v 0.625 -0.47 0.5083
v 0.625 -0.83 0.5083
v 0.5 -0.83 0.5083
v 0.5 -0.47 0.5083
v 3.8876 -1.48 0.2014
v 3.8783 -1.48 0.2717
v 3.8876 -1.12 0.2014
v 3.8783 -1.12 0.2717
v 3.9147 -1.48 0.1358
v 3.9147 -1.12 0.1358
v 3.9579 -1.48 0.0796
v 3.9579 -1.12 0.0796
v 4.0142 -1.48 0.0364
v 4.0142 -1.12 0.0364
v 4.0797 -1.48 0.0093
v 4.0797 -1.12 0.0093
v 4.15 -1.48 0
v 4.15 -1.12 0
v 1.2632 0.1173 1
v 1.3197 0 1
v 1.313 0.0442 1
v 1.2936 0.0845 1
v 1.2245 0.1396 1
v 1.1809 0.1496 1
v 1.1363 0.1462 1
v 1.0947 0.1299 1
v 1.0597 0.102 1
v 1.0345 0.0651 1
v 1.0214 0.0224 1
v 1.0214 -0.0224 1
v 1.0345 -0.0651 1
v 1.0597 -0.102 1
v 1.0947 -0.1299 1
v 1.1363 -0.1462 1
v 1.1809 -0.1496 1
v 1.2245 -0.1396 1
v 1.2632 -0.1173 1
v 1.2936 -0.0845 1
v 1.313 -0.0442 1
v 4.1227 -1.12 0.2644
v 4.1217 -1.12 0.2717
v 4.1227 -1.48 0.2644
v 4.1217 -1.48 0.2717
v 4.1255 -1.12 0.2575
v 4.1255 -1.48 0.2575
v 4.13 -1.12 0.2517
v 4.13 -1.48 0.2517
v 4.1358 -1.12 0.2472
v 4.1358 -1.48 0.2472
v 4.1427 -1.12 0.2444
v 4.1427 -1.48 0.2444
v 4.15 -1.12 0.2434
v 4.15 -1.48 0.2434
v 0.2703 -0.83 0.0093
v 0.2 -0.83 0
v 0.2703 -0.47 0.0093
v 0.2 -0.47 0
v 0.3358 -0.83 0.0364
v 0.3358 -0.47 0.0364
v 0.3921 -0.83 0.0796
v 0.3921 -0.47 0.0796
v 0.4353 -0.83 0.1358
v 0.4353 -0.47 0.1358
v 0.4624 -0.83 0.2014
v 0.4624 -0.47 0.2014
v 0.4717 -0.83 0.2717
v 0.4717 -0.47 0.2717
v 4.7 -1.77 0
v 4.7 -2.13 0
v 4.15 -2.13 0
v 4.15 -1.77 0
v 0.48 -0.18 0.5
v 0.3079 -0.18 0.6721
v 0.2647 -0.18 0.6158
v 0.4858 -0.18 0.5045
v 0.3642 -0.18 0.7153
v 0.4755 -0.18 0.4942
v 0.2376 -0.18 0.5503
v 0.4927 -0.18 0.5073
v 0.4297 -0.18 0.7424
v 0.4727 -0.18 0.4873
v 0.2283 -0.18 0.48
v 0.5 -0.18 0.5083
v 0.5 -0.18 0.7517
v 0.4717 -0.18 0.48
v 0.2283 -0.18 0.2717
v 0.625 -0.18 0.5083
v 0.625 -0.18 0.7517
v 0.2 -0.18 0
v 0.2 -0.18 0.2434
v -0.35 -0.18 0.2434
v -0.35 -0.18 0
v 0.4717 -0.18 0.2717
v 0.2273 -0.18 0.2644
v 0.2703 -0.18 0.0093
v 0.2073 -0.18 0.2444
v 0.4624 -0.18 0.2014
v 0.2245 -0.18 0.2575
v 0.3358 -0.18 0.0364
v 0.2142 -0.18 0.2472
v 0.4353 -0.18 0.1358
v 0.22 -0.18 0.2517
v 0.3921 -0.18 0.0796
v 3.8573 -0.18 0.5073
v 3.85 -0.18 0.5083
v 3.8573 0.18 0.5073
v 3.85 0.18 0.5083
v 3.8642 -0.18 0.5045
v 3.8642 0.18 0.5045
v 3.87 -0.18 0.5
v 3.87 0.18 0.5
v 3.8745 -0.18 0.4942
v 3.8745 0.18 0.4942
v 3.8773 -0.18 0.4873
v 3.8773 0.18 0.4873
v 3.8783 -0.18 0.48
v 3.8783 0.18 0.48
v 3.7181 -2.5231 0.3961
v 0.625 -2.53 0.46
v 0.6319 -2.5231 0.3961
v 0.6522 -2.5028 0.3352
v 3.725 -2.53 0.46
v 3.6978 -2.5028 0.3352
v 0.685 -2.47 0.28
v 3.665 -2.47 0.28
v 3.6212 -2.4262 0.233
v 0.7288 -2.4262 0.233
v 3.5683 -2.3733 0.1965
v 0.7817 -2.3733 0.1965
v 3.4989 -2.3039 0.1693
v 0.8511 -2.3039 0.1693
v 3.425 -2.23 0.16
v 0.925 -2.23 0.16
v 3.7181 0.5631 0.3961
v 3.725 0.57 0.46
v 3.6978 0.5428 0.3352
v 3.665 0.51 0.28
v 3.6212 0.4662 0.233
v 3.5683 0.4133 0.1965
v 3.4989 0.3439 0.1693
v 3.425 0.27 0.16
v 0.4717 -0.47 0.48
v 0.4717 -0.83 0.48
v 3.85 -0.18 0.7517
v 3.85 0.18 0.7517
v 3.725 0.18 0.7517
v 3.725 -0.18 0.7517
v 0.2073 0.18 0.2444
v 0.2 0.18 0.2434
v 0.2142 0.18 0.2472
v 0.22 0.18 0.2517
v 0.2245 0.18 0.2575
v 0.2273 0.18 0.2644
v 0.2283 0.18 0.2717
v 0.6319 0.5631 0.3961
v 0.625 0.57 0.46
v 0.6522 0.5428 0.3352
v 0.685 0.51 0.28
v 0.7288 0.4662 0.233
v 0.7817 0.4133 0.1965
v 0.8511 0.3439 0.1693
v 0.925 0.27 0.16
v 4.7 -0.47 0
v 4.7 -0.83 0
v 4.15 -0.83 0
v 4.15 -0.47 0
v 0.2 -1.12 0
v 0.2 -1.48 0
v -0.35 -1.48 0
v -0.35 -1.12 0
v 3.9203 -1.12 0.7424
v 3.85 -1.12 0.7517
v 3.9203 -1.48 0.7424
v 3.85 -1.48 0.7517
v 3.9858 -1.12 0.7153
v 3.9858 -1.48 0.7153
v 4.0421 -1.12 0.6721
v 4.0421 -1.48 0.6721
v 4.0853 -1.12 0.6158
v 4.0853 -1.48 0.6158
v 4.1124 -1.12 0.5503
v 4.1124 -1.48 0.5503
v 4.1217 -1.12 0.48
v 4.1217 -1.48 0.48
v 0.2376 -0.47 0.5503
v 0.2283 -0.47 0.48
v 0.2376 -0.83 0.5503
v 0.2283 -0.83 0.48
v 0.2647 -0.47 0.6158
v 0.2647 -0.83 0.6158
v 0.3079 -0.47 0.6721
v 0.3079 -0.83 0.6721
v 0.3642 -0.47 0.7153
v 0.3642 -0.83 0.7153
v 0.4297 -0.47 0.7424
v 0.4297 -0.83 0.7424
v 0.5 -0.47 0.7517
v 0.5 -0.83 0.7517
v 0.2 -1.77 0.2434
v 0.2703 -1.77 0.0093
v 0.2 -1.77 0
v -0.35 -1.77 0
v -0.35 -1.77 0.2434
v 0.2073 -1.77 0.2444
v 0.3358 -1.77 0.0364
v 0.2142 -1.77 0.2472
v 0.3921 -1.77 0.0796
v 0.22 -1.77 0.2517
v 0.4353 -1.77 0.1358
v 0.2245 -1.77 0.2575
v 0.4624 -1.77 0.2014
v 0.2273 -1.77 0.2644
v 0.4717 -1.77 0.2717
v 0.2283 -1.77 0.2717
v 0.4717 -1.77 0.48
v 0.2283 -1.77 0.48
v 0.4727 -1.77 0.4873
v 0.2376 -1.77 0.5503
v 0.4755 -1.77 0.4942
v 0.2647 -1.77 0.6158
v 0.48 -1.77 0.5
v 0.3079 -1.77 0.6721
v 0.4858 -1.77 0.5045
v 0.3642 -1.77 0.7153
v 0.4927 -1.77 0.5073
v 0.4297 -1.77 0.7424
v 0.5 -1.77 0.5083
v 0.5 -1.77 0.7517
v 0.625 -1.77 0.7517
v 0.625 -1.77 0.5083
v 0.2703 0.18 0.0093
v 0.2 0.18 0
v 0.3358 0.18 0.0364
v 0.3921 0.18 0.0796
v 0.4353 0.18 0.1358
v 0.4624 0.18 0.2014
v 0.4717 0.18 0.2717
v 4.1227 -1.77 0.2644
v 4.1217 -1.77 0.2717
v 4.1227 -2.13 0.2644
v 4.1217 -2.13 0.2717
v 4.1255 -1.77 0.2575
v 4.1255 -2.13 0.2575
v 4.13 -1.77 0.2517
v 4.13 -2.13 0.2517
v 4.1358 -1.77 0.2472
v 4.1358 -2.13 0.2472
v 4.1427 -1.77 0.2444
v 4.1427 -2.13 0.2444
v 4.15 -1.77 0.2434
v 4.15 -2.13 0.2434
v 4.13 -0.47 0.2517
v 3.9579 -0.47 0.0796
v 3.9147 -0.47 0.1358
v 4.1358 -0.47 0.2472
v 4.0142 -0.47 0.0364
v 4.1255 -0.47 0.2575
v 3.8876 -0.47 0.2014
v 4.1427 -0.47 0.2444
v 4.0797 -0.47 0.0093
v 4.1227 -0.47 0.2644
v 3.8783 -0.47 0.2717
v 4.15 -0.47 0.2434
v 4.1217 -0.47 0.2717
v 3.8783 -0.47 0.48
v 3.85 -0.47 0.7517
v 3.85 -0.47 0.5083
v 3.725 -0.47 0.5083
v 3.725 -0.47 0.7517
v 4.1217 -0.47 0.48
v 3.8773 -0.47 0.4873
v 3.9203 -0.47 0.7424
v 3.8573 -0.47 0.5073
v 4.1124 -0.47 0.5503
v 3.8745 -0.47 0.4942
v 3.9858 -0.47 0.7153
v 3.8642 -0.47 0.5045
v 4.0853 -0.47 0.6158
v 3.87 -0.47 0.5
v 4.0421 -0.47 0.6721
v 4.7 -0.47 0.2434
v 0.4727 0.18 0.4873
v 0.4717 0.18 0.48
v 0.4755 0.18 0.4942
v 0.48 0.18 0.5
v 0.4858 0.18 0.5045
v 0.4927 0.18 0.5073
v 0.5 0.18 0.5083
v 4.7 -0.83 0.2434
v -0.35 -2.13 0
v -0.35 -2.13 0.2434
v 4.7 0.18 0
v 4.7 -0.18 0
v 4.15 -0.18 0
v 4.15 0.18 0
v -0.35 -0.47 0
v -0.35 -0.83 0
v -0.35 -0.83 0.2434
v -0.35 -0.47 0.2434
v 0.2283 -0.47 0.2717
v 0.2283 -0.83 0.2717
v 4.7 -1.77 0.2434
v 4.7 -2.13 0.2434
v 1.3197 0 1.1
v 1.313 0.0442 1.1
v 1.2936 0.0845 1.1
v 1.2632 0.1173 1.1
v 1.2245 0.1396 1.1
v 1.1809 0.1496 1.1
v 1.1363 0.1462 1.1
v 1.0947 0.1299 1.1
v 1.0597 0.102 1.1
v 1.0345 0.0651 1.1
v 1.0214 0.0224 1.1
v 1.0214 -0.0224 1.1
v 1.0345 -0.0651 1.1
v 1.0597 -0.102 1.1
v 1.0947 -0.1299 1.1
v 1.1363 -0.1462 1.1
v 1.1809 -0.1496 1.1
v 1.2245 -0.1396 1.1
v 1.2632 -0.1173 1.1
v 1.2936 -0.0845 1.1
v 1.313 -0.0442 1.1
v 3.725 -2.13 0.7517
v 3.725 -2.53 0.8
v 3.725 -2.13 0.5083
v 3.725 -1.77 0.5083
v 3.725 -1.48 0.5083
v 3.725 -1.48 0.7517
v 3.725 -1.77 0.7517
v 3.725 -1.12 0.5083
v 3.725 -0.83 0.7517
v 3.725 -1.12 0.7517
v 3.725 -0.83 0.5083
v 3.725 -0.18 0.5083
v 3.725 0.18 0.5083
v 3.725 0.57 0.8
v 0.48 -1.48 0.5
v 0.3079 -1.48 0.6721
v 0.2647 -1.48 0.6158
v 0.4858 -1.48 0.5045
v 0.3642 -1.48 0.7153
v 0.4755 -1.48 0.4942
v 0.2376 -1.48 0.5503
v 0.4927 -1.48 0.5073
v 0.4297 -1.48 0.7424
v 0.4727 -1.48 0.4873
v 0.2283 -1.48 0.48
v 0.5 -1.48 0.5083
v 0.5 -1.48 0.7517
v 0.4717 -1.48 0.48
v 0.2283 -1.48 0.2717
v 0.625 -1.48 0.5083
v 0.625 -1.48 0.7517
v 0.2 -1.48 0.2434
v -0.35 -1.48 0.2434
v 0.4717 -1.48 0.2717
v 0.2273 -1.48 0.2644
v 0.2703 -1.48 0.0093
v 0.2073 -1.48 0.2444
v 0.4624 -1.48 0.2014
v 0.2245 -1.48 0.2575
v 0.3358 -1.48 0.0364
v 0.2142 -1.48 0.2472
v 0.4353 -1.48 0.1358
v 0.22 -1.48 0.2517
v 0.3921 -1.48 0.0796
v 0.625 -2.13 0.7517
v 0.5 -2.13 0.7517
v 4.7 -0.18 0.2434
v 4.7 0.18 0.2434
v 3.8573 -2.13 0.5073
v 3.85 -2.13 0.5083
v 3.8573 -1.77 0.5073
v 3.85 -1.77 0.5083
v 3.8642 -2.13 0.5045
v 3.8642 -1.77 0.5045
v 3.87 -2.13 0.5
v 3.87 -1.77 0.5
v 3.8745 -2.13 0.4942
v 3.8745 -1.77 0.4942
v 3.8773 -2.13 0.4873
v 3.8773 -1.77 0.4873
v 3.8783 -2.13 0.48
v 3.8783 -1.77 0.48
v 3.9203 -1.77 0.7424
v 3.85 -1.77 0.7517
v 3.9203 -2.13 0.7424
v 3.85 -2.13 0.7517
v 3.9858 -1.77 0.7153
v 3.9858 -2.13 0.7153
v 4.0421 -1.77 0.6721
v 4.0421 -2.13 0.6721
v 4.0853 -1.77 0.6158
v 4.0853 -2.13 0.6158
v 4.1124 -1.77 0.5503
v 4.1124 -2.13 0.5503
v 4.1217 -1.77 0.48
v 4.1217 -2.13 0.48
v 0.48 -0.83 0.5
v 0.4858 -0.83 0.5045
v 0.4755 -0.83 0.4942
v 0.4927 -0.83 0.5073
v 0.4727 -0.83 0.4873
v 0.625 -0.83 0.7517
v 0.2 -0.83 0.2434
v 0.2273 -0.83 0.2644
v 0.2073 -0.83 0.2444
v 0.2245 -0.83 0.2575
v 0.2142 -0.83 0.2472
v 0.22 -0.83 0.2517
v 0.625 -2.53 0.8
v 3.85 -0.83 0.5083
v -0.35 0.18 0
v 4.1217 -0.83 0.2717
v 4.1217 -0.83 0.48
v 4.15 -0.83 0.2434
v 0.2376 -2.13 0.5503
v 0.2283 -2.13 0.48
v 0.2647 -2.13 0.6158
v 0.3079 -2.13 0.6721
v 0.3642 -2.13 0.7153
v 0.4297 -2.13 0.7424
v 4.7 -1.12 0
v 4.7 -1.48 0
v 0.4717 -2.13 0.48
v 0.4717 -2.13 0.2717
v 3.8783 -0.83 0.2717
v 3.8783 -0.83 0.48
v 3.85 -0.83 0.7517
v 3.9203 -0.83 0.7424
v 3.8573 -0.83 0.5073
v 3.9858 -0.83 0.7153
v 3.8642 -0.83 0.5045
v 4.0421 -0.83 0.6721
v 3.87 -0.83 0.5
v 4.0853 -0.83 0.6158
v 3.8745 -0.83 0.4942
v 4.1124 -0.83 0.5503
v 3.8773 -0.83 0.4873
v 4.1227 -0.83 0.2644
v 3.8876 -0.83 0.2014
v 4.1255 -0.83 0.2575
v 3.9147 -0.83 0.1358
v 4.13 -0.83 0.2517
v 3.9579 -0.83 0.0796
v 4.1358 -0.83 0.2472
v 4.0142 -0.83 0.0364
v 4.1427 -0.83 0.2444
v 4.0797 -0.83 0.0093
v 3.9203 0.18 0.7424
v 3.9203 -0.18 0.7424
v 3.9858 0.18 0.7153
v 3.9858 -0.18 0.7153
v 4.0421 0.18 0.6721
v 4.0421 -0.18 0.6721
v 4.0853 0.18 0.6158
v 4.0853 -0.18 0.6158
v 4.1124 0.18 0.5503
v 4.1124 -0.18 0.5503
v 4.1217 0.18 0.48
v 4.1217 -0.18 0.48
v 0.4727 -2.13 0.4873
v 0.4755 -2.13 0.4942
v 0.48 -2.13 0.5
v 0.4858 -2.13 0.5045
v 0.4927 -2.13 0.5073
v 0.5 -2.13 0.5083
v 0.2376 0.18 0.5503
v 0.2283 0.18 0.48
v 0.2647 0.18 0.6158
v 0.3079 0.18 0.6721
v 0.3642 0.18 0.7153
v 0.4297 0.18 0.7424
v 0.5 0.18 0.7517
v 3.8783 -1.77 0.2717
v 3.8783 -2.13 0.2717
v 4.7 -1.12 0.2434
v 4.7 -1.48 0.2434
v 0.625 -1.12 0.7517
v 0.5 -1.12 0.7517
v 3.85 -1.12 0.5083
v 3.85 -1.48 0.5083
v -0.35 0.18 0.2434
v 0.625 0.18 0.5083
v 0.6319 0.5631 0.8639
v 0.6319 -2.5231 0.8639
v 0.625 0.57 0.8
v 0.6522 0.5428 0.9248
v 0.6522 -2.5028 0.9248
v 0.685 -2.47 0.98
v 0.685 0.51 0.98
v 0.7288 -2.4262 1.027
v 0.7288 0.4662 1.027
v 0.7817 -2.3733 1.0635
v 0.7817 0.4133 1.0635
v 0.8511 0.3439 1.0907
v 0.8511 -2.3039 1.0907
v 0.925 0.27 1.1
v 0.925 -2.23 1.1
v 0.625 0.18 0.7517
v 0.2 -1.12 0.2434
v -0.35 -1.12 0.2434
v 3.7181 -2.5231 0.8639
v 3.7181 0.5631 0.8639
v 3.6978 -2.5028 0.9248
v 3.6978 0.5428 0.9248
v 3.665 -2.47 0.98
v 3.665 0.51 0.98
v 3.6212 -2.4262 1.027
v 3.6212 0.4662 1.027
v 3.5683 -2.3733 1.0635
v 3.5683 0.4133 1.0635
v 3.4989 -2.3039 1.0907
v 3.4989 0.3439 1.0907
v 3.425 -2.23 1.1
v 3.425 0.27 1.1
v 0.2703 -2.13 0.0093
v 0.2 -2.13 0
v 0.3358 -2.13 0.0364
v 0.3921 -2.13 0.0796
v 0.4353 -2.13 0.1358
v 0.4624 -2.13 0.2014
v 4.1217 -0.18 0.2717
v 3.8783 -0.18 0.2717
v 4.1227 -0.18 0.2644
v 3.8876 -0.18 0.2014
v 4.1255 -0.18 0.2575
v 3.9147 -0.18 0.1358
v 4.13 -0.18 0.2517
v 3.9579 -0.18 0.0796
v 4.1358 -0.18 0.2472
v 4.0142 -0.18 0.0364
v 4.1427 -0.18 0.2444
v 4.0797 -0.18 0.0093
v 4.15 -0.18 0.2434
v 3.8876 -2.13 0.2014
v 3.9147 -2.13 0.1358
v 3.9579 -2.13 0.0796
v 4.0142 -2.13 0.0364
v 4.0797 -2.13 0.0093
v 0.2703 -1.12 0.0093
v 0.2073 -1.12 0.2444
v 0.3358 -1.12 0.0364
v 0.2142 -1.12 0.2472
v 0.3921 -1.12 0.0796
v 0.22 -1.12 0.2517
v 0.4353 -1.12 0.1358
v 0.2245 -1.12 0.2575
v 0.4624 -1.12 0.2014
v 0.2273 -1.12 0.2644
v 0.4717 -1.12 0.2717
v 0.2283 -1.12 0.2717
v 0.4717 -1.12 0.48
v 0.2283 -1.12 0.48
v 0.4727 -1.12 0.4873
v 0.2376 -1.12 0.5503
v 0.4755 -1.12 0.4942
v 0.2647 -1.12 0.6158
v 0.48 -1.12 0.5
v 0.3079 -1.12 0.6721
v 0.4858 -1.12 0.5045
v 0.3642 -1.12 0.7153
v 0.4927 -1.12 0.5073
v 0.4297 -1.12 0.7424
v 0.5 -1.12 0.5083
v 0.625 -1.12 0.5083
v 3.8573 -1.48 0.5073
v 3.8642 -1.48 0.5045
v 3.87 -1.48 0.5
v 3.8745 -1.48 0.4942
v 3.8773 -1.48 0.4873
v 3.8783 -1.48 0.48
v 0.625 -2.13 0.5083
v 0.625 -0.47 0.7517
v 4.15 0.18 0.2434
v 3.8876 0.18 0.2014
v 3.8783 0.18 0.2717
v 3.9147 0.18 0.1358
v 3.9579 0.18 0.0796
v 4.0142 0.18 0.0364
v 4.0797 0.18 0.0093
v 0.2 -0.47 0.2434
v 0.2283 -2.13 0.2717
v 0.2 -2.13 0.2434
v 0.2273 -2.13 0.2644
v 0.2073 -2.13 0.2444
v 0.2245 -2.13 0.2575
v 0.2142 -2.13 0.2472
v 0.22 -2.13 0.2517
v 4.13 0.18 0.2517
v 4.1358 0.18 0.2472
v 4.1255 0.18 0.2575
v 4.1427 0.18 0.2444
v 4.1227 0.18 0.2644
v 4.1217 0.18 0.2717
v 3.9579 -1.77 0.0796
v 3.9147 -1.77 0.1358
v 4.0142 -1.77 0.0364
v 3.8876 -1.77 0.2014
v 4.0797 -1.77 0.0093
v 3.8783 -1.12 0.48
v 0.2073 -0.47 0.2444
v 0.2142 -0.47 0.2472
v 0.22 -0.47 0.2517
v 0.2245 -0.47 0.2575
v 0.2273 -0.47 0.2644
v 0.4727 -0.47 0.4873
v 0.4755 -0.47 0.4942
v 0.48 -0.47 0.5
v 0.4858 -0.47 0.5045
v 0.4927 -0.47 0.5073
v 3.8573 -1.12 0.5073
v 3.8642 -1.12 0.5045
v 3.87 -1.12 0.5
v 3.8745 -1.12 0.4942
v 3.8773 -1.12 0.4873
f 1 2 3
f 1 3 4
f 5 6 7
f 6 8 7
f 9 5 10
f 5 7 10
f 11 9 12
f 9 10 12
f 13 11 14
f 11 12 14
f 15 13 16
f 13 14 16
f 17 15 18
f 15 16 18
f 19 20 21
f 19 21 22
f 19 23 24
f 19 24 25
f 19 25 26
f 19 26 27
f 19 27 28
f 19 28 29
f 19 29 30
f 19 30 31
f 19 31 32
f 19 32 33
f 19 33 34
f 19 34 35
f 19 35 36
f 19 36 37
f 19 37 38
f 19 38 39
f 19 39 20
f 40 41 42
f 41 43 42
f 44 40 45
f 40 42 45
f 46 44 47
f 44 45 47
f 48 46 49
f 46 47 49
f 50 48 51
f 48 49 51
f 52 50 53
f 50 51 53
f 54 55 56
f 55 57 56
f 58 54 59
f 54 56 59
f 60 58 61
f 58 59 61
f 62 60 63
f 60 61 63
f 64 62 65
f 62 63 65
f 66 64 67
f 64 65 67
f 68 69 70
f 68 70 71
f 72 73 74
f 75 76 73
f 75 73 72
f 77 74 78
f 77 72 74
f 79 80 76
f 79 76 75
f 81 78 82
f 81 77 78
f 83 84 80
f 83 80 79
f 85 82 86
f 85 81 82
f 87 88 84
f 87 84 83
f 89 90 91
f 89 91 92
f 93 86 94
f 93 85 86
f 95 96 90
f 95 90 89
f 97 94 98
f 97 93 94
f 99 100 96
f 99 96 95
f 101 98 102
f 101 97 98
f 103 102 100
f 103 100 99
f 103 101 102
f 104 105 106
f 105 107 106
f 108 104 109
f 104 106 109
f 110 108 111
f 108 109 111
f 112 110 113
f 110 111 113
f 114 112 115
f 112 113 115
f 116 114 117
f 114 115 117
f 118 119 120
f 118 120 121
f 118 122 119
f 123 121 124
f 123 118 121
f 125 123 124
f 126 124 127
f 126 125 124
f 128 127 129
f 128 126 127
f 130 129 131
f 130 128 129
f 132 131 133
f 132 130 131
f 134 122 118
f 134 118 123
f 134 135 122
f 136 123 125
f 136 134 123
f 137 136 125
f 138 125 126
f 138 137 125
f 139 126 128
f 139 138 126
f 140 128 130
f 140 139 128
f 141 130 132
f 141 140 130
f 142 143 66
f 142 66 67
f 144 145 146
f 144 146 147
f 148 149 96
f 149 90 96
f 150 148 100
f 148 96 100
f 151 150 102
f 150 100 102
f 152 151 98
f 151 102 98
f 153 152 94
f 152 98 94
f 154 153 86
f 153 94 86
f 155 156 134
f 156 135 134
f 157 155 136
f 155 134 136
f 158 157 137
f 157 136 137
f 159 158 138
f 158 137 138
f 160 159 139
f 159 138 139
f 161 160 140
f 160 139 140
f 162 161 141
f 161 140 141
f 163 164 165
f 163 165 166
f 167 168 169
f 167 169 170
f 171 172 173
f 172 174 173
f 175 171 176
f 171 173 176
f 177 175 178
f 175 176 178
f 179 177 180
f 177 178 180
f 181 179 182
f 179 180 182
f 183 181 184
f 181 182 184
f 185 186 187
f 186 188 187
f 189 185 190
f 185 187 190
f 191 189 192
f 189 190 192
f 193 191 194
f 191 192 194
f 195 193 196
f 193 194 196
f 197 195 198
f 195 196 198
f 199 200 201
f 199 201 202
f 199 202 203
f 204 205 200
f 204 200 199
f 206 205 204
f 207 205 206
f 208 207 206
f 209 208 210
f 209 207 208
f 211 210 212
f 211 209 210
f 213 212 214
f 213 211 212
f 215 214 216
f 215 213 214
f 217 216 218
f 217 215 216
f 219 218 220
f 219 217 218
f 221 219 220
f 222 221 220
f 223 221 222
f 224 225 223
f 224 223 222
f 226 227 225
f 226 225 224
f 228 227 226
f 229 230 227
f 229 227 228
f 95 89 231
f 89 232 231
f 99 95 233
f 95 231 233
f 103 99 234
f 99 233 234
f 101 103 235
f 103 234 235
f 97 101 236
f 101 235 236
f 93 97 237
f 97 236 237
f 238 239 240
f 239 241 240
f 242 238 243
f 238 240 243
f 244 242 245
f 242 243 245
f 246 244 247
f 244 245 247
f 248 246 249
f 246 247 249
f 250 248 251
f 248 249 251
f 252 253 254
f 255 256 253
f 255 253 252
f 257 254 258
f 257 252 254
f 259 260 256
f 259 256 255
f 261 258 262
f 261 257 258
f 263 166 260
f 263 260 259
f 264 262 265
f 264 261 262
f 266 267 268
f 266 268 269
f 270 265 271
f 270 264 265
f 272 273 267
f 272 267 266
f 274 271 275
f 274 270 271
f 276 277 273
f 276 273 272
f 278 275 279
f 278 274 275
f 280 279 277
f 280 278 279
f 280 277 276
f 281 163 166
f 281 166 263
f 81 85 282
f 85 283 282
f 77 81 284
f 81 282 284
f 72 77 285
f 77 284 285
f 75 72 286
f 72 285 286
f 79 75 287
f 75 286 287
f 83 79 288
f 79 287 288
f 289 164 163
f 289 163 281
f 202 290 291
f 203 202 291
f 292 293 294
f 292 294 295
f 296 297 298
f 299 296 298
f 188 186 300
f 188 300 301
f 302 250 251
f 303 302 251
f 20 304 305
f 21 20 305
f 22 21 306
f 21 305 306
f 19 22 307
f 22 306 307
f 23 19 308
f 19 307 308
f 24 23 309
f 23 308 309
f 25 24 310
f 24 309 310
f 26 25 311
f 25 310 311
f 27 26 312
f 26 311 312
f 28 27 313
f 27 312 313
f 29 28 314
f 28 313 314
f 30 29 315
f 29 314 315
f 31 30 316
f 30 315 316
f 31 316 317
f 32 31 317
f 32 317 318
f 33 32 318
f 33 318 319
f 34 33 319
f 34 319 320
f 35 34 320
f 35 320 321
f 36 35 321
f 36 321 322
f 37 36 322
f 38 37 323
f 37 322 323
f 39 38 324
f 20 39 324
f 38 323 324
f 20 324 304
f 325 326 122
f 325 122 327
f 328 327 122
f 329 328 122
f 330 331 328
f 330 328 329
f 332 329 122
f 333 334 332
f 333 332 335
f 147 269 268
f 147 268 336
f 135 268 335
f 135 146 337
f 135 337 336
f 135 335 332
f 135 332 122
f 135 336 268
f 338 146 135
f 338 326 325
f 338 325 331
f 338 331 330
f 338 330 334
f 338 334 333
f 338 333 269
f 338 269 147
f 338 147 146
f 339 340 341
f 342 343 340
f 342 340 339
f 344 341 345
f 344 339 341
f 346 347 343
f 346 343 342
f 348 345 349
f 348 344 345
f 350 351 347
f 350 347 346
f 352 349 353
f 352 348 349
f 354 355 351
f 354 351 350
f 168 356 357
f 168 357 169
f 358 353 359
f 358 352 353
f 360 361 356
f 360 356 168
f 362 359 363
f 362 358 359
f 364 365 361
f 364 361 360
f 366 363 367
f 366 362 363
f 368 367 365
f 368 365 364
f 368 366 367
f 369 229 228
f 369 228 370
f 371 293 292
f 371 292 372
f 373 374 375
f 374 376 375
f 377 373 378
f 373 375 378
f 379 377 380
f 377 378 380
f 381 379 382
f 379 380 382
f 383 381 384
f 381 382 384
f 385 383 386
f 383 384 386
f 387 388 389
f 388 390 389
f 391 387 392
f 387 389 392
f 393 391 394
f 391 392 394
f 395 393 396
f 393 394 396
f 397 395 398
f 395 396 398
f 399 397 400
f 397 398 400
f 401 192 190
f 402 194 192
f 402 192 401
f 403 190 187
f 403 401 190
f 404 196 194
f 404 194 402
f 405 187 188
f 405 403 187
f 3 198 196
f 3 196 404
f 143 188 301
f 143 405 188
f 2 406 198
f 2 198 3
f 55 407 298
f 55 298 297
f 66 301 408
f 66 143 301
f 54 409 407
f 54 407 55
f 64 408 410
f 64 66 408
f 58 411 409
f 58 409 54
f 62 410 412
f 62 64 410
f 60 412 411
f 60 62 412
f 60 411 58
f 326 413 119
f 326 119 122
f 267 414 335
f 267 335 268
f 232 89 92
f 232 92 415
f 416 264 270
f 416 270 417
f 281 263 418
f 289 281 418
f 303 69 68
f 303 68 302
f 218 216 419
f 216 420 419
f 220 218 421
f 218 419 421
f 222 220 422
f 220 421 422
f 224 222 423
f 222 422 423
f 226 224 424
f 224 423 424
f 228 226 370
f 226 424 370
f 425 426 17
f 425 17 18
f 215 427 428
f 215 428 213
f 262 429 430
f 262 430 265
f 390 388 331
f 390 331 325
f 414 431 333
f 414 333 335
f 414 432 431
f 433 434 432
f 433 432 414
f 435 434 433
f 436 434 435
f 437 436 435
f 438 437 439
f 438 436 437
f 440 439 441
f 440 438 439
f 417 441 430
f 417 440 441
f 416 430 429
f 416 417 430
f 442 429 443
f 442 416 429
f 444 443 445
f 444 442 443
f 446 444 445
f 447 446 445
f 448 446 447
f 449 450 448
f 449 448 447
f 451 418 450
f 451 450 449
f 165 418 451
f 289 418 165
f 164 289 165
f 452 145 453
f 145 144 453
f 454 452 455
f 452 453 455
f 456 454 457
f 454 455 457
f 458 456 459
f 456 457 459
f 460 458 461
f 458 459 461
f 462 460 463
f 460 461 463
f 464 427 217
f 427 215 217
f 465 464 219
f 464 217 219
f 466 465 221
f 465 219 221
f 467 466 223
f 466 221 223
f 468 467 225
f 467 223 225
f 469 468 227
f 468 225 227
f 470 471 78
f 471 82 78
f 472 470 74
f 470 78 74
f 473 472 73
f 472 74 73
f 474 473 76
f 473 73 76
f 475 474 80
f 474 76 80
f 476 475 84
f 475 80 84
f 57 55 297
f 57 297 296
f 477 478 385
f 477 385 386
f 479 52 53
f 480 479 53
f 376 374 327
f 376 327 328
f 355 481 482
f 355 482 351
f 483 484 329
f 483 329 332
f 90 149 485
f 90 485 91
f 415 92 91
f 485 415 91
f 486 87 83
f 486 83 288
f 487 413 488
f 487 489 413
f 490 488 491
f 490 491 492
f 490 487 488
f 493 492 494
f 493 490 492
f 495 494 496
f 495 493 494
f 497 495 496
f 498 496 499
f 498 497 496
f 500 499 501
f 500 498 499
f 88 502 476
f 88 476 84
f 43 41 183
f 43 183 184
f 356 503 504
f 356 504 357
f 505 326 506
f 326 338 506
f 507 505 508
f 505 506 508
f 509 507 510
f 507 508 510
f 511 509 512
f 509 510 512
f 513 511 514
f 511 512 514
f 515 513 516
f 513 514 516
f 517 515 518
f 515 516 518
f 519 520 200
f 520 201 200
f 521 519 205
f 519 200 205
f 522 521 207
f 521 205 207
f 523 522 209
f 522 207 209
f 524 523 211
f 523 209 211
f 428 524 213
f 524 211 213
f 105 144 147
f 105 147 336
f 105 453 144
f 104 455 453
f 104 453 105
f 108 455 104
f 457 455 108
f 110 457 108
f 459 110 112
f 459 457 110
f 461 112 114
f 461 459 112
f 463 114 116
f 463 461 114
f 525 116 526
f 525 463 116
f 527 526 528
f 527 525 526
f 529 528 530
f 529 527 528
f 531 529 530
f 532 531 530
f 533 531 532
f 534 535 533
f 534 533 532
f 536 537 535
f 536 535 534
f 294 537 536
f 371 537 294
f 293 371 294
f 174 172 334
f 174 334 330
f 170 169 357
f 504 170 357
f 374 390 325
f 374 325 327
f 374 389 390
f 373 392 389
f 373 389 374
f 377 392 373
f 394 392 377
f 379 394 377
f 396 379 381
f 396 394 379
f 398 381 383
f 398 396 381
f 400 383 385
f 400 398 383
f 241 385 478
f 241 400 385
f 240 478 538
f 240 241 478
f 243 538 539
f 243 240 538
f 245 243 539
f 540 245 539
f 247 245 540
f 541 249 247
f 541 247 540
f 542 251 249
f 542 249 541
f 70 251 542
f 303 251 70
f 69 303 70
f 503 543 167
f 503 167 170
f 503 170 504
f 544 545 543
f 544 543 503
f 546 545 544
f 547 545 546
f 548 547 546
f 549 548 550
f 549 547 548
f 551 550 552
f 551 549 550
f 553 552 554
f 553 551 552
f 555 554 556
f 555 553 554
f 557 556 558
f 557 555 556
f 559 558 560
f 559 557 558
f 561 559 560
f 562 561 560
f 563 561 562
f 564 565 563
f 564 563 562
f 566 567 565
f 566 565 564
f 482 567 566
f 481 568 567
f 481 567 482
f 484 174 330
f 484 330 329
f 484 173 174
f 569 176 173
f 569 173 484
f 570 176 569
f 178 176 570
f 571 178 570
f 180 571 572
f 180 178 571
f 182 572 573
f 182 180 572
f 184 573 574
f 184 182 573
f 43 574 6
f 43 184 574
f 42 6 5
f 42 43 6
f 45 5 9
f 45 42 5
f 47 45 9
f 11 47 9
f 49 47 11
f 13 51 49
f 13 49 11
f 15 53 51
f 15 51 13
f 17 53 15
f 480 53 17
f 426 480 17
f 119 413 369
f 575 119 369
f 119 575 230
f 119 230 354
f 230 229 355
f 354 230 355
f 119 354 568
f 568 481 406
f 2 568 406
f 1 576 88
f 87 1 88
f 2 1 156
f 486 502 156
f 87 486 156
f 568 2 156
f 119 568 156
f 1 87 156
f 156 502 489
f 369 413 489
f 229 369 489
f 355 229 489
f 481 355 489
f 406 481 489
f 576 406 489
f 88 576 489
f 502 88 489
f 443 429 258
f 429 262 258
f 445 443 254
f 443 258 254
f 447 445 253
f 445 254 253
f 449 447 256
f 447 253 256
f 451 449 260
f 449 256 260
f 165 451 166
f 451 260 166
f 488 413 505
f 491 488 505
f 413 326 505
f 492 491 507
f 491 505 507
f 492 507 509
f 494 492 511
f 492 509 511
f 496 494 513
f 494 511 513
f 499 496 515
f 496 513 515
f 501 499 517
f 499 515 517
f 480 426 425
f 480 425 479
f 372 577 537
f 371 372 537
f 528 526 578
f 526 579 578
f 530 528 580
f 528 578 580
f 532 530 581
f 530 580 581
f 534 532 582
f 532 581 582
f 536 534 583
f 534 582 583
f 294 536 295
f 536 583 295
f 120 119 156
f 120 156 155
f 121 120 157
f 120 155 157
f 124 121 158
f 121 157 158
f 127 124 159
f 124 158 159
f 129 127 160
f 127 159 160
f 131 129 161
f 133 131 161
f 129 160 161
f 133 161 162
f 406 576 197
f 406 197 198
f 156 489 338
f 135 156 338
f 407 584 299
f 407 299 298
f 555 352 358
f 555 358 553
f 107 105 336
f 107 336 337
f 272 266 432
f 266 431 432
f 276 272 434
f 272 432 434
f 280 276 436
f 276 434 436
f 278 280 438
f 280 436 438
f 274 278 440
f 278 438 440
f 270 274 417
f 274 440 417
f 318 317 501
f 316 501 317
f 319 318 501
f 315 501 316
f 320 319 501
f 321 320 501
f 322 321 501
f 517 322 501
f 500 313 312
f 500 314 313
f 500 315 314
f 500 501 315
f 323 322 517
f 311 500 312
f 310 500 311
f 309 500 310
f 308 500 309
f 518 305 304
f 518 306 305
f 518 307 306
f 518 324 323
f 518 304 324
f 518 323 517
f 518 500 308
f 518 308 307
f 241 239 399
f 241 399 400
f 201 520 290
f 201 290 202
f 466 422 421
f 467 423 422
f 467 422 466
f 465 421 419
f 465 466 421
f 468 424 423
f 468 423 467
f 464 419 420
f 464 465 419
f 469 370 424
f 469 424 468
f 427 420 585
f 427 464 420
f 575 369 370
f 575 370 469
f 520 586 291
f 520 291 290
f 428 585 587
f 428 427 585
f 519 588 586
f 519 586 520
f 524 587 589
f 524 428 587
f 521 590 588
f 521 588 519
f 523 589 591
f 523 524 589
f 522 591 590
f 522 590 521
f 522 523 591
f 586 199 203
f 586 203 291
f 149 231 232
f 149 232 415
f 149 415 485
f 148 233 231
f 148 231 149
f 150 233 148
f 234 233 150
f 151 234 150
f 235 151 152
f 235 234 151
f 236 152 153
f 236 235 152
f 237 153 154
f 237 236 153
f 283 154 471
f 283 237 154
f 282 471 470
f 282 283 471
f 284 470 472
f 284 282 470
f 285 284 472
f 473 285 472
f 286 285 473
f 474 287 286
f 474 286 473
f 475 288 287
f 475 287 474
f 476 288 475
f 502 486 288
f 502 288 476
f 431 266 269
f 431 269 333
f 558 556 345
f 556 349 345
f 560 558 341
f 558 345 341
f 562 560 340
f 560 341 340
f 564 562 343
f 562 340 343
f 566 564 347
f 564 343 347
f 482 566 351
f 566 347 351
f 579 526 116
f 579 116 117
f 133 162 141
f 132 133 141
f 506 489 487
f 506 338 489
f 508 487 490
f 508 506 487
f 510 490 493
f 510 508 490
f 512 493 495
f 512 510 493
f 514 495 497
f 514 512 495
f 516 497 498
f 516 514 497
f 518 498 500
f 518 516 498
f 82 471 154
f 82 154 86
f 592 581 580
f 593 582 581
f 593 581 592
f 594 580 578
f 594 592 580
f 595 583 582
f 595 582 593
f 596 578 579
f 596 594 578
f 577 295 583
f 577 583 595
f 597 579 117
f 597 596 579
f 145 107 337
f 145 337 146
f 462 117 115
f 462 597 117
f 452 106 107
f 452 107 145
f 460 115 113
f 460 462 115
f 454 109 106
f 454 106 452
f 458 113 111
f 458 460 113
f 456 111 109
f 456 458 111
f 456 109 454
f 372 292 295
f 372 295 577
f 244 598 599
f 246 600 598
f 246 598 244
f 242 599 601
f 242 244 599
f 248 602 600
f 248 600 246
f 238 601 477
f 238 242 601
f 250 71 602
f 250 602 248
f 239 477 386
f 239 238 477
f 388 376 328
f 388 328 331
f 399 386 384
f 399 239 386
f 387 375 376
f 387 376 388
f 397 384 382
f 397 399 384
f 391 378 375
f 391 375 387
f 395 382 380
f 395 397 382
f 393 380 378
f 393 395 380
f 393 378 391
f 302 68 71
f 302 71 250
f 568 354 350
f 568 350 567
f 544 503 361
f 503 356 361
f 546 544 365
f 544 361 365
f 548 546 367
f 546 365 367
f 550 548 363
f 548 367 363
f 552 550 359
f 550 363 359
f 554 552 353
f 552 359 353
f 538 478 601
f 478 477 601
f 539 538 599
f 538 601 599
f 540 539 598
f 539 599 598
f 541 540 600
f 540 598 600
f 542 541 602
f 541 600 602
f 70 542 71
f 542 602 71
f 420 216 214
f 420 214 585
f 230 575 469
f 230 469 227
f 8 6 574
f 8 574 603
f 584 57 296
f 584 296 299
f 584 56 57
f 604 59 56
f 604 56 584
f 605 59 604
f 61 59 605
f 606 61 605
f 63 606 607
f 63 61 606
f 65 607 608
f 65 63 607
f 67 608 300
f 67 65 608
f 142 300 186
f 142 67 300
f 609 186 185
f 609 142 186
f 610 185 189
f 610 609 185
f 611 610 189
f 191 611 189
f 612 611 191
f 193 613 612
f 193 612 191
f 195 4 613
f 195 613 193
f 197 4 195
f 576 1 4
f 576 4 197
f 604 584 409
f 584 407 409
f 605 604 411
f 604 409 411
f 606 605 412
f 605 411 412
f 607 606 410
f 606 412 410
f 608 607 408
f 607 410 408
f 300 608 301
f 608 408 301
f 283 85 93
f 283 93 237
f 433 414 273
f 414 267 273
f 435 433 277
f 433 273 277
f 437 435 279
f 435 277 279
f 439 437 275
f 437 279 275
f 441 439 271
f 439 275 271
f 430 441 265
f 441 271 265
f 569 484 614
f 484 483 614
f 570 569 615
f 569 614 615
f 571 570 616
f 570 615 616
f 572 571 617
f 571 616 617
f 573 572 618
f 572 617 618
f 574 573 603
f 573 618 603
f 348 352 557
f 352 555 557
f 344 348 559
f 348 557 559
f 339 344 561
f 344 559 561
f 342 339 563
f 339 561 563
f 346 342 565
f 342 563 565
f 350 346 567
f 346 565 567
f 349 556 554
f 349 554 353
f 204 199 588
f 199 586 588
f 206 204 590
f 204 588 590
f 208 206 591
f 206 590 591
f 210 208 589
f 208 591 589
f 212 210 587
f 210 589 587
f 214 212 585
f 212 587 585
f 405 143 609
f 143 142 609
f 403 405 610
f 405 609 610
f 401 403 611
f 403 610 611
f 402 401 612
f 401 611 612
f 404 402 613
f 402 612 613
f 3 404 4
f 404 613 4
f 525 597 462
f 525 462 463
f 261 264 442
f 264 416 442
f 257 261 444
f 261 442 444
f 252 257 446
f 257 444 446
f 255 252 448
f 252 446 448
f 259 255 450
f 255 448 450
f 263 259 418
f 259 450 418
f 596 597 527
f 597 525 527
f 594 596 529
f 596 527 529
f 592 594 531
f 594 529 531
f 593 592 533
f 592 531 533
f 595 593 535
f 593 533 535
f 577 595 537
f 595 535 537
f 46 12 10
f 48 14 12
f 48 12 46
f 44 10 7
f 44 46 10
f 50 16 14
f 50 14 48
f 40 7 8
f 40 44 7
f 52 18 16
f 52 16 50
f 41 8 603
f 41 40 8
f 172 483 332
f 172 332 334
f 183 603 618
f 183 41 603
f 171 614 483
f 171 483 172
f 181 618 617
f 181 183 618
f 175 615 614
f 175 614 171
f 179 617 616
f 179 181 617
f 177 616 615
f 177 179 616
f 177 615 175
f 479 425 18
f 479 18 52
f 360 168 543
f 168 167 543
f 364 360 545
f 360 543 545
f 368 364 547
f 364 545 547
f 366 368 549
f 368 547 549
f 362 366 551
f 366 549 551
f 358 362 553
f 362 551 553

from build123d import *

# Parameters (mm, degrees)
SKETCH_3_W          = 3.1
SKETCH_3_H          = 3.1
EXTRUDE_1_DEPTH     = 0.94
FILLET_2_R          = 0.3
SKETCH_4_R          = 0.15
CUT_EXTRUDE_1_DEPTH = 0.1
SKETCH_5_W          = 0.243392782
SKETCH_5_H          = 0.36


with BuildPart() as part:
    # Эскиз3 → Вытянуть1 (new body)
    with BuildSketch(Plane.XY.offset(1.1)):
        with Locations((2.175, -0.98)):
            Rectangle(SKETCH_3_W, SKETCH_3_H)
    extrude(amount=-EXTRUDE_1_DEPTH)

    # Скругление2
    fillet_2_edges = [part.edges().sort_by_distance(p)[0] for p in [
        (2.175, 0.57, 1.1),
        (2.175, 0.57, 0.16),
        (3.725, -0.98, 1.1),
        (3.725, -0.98, 0.16),
        (2.175, -2.53, 1.1),
        (2.175, -2.53, 0.16),
        (0.625, -0.98, 1.1),
        (0.625, -0.98, 0.16),
    ]]
    fillet(fillet_2_edges, radius=FILLET_2_R)

    # Эскиз4 → Вырез-Вытянуть1 (cut)
    with BuildSketch(Plane.XY.offset(1.1)):
        with Locations((1.169675261, 0)):
            Circle(SKETCH_4_R)
    extrude(amount=-CUT_EXTRUDE_1_DEPTH, mode=Mode.SUBTRACT)

    # По траектории4: sweep along a path in Эскиз6
    with BuildLine(Plane(origin=(0, 0, 0), x_dir=(1, 0, 0), z_dir=(0, 1, 0))) as sweep_4_path:
        Line((-0.35, -0.121696391), (0.2, -0.121696391))
        ThreePointArc((0.2, -0.121696391), (0.306066017, -0.165630374), (0.35, -0.271696391))
        Line((0.35, -0.271696391), (0.35, -0.48))
        ThreePointArc((0.35, -0.48), (0.393933983, -0.586066017), (0.5, -0.63))
        Line((0.5, -0.63), (0.625, -0.63))
        Line((0.625, -0.63), (3.725, -0.63))
        Line((3.725, -0.63), (3.85, -0.63))
        ThreePointArc((3.85, -0.63), (3.956066017, -0.586066017), (4, -0.48))
        Line((4, -0.48), (4, -0.271696391))
        ThreePointArc((4, -0.271696391), (4.043933983, -0.165630374), (4.15, -0.121696391))
        Line((4.15, -0.121696391), (4.7, -0.121696391))
    # Эскиз5 → По траектории4 (sweep)
    with BuildSketch(Plane(origin=(-0.35, 0, 0), x_dir=(0, 0, -1), z_dir=(1, 0, 0))):
        with Locations((-0.121696391, -0.65)):
            Rectangle(SKETCH_5_W, SKETCH_5_H)
        with Locations((-0.121696391, 0)):
            Rectangle(SKETCH_5_W, SKETCH_5_H)
        with Locations((-0.121696391, -1.3)):
            Rectangle(SKETCH_5_W, SKETCH_5_H)
        with Locations((-0.121696391, -1.95)):
            Rectangle(SKETCH_5_W, SKETCH_5_H)
    sweep(path=sweep_4_path.line)


solid = part.part
